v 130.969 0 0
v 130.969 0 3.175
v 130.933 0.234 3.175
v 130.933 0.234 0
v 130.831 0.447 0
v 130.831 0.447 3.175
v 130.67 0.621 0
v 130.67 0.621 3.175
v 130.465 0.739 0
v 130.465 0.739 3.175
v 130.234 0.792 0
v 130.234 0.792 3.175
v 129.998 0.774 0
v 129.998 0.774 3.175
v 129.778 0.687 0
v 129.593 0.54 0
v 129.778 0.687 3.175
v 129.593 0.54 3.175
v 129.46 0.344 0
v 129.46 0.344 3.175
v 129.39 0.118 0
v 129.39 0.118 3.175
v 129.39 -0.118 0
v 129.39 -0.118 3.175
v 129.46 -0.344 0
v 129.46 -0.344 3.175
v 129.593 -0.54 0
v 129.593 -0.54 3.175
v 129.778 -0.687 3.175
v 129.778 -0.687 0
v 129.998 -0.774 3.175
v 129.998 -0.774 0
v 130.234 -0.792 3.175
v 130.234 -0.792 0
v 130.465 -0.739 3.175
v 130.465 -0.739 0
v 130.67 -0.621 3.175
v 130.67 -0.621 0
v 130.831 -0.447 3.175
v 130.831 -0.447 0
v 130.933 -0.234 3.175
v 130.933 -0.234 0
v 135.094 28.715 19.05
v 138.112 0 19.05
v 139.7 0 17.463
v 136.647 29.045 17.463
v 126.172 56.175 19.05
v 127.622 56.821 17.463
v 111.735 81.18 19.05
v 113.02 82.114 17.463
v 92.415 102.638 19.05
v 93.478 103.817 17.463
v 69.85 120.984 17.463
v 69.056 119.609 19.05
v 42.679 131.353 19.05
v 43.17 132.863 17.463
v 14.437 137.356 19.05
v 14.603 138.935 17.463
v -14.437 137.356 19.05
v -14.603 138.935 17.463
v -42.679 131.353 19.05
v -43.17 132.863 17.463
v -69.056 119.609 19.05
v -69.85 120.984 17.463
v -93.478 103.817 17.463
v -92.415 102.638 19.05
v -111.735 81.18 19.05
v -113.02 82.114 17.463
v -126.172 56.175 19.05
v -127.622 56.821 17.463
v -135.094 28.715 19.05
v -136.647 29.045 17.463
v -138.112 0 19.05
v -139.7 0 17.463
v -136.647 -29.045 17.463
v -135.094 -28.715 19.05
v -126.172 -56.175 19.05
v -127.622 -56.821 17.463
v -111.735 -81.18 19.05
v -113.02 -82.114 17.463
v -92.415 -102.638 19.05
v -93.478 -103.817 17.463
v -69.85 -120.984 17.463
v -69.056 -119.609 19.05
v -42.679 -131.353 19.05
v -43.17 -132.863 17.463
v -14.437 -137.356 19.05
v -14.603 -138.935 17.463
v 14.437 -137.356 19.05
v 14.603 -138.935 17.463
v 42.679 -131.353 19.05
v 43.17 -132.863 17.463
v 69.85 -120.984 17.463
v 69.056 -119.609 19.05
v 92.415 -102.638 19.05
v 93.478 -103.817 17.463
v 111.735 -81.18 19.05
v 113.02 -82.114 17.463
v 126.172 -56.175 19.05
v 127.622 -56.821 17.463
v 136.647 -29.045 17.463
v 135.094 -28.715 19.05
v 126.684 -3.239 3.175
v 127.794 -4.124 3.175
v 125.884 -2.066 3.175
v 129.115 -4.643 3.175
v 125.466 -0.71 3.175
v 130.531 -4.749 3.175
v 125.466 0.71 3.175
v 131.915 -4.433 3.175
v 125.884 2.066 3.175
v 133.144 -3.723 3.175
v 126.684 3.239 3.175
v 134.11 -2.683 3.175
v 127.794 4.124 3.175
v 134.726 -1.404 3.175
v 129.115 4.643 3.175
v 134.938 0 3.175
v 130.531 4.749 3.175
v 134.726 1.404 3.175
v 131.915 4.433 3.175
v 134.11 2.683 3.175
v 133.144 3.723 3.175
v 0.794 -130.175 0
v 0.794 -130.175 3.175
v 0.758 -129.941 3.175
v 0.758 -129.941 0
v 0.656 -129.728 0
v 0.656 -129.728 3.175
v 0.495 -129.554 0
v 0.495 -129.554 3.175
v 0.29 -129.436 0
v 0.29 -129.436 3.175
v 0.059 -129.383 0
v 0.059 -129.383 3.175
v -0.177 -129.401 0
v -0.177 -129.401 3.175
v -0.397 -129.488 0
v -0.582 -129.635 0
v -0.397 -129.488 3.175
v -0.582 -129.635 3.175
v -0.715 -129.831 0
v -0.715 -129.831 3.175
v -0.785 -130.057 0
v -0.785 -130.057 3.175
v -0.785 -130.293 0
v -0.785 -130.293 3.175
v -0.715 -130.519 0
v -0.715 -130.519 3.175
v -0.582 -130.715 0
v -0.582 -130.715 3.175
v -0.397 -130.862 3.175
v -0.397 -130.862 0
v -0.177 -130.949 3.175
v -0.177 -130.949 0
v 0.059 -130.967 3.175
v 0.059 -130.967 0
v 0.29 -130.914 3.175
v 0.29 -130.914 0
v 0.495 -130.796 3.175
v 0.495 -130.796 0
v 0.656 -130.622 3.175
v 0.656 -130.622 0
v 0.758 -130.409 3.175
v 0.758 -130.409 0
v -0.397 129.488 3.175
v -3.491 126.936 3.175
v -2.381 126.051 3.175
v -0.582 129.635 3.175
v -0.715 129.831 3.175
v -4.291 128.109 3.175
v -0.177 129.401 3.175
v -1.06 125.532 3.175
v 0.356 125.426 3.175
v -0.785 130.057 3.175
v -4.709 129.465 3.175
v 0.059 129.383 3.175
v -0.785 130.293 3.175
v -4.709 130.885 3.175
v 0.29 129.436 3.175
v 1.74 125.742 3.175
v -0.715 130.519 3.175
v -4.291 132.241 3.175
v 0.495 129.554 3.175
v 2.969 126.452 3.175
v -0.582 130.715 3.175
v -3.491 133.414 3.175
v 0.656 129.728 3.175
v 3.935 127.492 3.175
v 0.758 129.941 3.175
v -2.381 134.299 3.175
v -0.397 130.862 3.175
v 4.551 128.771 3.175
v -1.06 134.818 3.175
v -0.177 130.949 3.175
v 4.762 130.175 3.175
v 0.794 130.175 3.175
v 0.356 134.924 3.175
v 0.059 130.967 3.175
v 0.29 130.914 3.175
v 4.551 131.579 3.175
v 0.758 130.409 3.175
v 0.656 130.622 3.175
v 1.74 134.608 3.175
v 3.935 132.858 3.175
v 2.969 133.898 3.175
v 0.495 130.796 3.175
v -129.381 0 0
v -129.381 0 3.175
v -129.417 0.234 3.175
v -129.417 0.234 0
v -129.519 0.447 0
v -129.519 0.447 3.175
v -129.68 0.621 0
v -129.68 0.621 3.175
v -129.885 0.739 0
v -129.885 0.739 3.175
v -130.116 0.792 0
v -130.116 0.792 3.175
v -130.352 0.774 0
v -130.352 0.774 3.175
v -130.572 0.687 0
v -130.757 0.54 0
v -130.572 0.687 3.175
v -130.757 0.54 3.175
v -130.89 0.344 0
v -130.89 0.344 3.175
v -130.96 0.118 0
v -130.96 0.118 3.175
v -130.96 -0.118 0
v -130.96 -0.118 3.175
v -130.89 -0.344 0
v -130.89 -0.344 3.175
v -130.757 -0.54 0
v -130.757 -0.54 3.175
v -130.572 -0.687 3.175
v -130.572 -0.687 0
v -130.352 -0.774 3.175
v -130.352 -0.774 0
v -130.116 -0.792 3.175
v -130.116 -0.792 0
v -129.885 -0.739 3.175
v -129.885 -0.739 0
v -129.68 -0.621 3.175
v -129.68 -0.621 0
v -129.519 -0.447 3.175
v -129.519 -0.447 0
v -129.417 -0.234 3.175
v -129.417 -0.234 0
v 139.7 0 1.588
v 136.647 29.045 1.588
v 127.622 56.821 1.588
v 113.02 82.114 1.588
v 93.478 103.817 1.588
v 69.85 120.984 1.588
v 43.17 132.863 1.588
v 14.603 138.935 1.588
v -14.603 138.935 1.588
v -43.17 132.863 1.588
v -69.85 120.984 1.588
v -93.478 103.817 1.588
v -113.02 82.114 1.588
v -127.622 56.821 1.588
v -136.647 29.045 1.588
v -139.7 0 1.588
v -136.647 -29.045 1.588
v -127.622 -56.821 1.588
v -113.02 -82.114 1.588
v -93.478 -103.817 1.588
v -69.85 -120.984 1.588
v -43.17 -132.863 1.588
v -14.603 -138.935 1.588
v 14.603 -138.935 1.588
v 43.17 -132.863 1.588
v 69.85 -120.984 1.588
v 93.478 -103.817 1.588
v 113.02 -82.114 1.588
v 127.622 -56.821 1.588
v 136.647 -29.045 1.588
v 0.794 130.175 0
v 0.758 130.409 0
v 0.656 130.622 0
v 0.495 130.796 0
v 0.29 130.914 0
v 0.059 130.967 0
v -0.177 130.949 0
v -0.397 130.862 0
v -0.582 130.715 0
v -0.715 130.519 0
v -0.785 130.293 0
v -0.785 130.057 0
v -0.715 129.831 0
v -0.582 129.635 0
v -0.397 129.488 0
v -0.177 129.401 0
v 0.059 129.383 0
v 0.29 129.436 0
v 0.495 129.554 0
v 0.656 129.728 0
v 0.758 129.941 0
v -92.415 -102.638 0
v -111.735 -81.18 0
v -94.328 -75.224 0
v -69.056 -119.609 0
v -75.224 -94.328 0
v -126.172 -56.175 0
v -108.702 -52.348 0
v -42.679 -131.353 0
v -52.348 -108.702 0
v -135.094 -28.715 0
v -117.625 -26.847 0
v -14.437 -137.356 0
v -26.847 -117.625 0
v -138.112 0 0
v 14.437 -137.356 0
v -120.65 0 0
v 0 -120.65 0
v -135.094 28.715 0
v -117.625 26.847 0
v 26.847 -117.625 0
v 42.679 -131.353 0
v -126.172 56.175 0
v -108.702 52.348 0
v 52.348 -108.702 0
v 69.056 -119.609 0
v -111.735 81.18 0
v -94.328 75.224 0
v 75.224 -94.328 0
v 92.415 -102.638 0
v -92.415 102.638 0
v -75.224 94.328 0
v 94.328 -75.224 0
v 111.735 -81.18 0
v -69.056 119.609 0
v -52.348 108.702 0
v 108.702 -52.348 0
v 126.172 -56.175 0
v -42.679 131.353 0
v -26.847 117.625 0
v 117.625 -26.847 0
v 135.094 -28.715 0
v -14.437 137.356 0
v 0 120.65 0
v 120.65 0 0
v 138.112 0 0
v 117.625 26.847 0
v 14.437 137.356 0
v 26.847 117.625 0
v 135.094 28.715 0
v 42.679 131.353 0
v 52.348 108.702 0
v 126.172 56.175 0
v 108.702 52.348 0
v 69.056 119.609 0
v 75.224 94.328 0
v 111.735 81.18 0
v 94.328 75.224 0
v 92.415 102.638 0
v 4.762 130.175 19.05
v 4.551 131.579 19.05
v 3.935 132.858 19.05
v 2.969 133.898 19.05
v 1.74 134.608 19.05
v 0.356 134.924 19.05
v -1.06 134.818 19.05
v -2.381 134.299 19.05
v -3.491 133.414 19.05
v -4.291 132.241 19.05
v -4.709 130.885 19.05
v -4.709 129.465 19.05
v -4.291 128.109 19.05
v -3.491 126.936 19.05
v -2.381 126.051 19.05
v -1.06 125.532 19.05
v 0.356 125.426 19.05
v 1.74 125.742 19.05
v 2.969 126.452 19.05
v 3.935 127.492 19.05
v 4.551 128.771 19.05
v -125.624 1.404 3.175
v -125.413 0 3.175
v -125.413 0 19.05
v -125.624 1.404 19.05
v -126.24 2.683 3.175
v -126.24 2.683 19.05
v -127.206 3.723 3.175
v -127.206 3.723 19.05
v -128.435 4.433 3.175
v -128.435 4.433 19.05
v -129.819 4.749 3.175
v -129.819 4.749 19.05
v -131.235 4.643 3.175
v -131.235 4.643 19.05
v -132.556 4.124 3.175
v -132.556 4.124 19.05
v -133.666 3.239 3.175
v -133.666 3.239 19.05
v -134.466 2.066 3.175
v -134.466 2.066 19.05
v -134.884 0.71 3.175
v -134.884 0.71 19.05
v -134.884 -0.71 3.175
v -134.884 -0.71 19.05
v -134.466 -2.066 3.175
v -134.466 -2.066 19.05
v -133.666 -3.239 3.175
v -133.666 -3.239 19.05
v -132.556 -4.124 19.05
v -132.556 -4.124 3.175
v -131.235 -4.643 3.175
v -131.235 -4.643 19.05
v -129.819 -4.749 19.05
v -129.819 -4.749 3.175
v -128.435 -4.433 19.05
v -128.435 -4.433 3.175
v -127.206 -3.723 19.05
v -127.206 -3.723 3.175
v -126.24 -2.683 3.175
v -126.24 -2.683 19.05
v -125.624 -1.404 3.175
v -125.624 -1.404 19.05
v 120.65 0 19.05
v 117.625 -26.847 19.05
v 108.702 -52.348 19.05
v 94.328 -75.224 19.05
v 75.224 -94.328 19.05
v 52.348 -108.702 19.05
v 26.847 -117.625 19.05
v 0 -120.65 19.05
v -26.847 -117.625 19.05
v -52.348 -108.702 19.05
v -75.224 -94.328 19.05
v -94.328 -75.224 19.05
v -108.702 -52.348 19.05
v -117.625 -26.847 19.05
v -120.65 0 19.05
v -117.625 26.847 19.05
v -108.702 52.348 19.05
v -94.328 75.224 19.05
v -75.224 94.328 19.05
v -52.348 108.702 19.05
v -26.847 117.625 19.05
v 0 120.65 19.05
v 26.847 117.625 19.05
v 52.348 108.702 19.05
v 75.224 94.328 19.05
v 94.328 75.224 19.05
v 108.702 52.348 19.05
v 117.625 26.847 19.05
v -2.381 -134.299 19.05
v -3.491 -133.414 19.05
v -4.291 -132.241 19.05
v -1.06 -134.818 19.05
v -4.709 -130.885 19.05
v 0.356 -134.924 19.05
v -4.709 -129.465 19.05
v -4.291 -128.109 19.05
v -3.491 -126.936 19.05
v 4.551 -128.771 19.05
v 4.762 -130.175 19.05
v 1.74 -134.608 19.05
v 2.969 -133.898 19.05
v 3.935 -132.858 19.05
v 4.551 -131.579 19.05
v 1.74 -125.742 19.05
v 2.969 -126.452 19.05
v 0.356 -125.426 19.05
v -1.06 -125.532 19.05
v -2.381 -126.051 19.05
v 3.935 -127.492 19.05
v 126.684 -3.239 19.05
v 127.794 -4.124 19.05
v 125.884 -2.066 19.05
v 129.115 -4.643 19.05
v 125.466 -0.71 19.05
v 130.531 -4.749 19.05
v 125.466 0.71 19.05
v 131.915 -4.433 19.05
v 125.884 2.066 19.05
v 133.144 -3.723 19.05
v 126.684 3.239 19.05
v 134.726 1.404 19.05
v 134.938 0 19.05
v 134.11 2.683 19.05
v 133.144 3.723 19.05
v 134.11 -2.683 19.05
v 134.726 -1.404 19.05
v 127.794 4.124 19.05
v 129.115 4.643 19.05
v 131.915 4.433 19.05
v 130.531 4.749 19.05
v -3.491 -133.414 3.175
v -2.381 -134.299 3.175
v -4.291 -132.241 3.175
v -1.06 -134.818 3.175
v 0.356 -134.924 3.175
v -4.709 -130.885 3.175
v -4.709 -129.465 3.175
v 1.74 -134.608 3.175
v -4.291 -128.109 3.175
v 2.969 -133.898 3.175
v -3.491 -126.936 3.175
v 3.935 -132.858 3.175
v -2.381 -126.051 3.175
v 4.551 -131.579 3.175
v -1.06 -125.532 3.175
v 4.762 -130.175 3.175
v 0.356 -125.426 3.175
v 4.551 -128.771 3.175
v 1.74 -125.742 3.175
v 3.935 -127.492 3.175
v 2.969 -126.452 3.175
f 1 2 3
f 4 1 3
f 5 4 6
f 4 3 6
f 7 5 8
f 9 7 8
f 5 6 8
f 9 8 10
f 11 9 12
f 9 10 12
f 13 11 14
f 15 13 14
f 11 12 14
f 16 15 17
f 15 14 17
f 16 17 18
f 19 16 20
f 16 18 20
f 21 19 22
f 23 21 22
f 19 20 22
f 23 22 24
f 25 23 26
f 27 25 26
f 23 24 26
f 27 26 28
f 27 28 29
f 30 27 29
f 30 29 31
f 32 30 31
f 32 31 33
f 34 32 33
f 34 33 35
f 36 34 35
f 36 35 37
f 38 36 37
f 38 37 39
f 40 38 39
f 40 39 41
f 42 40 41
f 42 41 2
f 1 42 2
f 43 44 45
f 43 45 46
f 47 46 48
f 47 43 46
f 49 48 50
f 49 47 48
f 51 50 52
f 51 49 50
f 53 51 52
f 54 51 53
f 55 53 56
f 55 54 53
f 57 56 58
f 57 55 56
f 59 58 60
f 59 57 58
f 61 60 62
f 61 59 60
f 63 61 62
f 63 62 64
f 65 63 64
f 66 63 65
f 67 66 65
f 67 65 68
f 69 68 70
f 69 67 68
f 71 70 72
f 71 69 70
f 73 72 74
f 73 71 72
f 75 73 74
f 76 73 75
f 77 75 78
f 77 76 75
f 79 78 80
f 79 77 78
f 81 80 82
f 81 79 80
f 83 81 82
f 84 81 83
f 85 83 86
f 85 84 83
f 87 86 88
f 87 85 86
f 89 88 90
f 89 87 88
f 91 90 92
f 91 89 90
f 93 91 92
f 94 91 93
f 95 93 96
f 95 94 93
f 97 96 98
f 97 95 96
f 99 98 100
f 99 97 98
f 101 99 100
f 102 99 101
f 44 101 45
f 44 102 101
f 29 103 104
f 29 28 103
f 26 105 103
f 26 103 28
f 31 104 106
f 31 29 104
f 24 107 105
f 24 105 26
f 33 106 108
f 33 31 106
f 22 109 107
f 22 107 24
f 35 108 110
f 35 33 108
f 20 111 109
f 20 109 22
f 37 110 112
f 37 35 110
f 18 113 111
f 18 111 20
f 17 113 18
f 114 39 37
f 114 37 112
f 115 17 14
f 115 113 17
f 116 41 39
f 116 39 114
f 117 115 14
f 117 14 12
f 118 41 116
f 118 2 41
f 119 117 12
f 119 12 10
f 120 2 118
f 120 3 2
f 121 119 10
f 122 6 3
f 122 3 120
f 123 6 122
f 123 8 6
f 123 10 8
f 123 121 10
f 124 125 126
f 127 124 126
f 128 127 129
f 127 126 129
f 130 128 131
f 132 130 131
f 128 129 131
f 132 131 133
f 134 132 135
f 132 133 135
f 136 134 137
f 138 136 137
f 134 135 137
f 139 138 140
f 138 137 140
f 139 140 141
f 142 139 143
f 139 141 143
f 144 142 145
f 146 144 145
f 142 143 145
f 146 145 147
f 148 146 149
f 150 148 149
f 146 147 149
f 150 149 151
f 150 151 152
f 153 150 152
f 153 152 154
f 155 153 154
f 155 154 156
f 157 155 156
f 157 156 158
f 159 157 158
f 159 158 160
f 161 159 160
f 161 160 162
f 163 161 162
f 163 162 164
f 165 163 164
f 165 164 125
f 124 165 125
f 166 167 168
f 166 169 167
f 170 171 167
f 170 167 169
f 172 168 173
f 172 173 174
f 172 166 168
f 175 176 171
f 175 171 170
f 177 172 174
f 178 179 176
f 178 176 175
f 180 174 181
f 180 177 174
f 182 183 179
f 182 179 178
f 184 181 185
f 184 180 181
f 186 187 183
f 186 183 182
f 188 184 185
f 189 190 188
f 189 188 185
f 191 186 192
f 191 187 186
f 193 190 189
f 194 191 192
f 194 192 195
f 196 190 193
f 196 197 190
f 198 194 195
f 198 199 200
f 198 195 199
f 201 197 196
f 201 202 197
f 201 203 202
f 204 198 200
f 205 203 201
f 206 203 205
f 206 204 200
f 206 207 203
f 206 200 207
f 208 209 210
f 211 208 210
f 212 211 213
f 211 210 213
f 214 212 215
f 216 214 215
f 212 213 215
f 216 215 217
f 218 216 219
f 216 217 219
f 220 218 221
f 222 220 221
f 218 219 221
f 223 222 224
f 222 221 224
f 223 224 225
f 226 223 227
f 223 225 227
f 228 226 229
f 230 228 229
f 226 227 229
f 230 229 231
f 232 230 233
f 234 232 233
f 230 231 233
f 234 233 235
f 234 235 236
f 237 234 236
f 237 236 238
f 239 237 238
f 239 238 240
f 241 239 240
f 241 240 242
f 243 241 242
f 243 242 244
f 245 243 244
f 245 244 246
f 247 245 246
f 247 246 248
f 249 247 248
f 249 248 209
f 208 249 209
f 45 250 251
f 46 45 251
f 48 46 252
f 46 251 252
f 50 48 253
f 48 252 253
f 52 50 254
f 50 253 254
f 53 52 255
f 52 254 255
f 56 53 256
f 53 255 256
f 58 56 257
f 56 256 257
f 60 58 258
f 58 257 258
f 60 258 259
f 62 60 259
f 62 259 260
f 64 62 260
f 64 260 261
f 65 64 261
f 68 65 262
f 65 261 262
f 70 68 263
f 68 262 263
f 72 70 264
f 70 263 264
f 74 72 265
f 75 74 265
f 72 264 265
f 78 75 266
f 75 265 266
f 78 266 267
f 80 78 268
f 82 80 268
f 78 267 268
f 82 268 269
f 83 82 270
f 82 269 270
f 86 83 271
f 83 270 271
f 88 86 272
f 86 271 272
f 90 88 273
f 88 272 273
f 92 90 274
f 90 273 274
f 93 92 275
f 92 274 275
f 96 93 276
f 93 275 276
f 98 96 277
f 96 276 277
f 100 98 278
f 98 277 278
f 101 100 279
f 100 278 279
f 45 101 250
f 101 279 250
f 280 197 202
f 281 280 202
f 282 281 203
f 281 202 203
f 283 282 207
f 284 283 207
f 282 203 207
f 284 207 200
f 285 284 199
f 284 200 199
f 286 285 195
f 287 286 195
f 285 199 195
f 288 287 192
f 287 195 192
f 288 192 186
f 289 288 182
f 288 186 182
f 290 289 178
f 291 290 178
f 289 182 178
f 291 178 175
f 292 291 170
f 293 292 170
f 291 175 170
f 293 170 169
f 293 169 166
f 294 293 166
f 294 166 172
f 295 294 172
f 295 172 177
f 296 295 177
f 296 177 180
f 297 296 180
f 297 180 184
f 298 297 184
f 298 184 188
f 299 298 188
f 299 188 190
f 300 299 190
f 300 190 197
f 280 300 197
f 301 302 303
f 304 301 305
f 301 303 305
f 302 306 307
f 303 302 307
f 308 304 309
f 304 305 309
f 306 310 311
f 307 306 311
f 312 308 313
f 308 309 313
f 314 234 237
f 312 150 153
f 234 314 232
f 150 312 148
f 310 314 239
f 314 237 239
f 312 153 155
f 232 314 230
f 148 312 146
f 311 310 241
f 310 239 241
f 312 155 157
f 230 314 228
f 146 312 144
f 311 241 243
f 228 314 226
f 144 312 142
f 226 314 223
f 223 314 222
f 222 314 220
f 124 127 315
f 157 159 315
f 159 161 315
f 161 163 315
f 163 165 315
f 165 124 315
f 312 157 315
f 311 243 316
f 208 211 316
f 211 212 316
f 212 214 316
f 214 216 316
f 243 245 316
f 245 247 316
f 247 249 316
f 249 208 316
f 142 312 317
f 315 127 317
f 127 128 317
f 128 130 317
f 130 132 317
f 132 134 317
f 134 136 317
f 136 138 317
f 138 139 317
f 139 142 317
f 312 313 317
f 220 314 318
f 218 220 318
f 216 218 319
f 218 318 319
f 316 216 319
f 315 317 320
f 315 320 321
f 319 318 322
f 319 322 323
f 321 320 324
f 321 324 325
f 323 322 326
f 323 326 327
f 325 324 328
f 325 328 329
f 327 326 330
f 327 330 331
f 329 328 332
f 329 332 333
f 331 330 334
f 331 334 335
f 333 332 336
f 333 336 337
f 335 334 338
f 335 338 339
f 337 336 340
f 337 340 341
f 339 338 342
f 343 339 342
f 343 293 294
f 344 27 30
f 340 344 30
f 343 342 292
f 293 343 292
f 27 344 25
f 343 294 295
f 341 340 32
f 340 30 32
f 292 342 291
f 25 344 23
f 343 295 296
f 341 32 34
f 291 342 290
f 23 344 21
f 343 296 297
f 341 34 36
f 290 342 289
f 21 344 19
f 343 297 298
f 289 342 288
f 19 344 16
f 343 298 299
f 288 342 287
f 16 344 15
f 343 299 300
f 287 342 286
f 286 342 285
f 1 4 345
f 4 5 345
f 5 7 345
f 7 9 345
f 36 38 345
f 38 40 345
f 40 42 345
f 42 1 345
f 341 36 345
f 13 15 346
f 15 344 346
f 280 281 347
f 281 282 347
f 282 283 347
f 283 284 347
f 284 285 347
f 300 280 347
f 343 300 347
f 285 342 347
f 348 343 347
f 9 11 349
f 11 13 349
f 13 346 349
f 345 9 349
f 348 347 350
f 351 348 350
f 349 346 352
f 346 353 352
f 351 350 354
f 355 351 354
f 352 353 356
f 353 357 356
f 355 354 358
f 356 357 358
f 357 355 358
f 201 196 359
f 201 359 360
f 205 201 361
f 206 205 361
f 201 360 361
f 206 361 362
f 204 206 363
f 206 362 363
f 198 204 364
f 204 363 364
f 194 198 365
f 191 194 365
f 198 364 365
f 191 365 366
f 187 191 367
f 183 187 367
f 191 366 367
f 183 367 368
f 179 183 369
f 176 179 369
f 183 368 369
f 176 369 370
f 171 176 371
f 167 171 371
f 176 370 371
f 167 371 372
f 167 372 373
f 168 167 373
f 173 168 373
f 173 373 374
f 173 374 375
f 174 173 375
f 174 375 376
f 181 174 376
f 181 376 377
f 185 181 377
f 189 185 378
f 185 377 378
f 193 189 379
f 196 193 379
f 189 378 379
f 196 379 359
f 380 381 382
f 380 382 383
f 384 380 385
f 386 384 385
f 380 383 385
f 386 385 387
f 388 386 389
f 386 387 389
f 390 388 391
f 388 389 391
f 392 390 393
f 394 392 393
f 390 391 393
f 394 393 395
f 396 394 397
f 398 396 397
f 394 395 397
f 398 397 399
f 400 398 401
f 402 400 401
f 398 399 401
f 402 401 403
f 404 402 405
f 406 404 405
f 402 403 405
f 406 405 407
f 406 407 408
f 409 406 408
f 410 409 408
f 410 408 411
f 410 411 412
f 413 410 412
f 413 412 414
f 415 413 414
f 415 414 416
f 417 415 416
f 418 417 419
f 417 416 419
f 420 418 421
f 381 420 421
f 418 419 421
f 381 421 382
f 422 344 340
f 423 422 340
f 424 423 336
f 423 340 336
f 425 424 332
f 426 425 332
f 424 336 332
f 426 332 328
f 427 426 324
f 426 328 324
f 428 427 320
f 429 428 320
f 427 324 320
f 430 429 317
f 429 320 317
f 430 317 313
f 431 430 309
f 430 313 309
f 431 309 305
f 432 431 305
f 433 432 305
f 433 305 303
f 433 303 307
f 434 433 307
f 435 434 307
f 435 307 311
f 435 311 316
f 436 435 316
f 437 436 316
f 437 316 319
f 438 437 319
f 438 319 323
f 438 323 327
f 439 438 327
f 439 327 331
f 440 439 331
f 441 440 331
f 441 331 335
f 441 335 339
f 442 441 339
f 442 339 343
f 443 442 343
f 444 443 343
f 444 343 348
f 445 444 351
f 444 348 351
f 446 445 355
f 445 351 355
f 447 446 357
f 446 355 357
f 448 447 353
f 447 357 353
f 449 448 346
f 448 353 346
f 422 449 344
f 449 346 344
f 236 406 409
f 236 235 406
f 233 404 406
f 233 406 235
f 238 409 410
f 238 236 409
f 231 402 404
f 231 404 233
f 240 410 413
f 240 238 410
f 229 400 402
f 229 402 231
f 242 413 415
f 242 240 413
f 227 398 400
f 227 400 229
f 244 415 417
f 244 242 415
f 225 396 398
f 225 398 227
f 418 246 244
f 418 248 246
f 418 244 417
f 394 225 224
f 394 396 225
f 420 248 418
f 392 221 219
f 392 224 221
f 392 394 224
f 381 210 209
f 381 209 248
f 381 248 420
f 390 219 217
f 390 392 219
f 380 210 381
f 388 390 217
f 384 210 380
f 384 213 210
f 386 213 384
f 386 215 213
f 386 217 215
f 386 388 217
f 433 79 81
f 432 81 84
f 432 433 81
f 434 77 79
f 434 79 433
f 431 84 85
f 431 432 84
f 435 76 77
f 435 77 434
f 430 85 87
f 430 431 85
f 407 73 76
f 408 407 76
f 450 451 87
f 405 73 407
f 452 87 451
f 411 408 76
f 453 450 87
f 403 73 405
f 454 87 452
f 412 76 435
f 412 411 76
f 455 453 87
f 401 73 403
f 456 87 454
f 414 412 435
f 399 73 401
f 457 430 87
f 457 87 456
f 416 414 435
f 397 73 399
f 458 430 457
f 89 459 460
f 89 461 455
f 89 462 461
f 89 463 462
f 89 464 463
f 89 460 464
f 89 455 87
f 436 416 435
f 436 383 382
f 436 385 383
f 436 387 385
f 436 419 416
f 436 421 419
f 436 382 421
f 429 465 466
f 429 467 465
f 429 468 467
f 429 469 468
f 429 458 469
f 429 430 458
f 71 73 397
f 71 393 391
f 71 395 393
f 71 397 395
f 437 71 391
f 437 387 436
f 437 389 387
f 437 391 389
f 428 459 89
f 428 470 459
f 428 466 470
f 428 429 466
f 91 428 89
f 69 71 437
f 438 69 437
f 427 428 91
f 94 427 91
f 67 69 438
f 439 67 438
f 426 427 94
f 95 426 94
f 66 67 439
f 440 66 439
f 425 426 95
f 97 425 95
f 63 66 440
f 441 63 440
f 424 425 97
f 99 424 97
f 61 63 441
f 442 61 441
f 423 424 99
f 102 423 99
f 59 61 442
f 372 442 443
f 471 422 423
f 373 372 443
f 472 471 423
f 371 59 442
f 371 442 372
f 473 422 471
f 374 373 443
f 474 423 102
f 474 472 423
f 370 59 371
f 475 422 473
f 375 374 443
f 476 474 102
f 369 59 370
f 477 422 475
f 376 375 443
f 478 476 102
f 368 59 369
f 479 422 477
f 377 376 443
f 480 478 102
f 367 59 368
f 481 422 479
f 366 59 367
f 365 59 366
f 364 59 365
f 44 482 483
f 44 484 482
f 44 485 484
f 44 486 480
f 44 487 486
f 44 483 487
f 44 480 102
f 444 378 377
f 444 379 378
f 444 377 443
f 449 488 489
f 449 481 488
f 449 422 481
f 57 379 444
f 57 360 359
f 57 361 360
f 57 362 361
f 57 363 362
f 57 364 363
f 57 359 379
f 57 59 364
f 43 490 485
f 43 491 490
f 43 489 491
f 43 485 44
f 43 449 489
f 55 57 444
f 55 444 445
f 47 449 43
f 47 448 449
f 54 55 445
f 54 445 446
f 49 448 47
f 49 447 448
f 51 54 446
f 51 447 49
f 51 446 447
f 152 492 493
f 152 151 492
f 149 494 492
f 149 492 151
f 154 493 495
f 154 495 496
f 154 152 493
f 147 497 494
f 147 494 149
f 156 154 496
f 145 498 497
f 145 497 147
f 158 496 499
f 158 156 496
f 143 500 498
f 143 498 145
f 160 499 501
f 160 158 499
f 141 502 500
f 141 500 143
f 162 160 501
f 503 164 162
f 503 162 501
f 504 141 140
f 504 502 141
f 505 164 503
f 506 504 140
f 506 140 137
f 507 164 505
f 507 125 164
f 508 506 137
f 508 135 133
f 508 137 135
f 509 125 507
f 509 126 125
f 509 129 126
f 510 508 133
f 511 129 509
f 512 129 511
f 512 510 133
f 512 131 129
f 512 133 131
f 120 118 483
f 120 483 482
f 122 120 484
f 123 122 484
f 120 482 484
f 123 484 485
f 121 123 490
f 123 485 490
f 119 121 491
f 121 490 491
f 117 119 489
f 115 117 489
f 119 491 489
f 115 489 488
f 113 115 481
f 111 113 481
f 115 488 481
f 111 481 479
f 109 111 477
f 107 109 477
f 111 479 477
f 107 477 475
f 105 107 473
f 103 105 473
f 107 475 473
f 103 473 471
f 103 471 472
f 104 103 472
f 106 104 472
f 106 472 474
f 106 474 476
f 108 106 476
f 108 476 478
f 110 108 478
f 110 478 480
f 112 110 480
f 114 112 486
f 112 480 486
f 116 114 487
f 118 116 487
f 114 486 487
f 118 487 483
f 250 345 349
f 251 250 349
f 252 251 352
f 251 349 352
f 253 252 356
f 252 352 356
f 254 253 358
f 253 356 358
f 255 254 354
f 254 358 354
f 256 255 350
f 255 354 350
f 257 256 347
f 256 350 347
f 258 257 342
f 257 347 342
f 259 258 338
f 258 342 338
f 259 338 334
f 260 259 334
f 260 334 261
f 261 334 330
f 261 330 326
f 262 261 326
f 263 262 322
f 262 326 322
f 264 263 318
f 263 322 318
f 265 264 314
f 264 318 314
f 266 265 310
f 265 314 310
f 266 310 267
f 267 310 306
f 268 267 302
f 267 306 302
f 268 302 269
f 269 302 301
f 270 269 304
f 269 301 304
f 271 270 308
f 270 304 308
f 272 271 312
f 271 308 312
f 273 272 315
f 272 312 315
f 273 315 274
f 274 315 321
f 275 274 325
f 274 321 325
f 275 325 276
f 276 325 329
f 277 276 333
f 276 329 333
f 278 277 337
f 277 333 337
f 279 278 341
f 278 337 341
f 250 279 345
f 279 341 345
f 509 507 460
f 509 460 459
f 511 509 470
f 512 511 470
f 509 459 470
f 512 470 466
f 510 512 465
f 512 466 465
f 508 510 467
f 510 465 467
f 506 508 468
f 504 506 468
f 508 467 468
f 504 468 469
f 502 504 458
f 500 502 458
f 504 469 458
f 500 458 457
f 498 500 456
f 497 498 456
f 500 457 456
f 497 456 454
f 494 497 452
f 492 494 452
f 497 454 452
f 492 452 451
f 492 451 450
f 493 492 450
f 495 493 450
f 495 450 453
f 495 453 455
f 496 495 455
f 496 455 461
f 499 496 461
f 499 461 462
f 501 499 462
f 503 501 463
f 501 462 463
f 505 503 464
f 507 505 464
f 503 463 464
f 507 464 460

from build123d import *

# Parameters (mm, degrees)
F2_R      = 139.7
F3_DEPTH  = 19.05
F4_SIZE   = 1.5875
F5_R      = 120.65
F6_DEPTH  = 19.051
F7_R      = 0.79375
F8_DEPTH  = 19.051
F9_R      = 4.7625
F9_R_2    = 0.79375
F10_DEPTH = 15.875


# Not quite as in the source:
# - a variable given as a bare number and used for a length is read in inches; the dataset says mm whatever the document's units were


with BuildPart() as f3:
    # F2 (on Top) → F3 (new body)
    with BuildSketch(Plane.XY):
        Circle(F2_R)
    extrude(amount=F3_DEPTH)

    # F4
    f4_edges = [f3.edges().sort_by_distance(p)[0] for p in [
        (-139.7, 0, 19.05),
        (-139.7, 0, 0),
    ]]
    chamfer(f4_edges, length=F4_SIZE)

    # F5 (on face) → F6 (cut, through all)
    with BuildSketch(Plane(origin=(0, 0, 0), x_dir=(1, 0, 0), z_dir=(0, 0, -1))):
        Circle(F5_R)
    extrude(amount=-F6_DEPTH, mode=Mode.SUBTRACT)

    # F7 (on face) → F8 (cut, through all)
    with BuildSketch(Plane.XY.offset(19.05)):
        with Locations((0, 130.175)):
            Circle(F7_R)
        with Locations((130.175, 0)):
            Circle(F7_R)
        with Locations((0, -130.175)):
            Circle(F7_R)
        with Locations((-130.175, 0)):
            Circle(F7_R)
    extrude(amount=-F8_DEPTH, mode=Mode.SUBTRACT)

    # F9 (on face) → F10 (cut)
    with BuildSketch(Plane.XY.offset(19.05)):
        with Locations((0, 130.175)):
            Circle(F9_R)
        with Locations((0, 130.175)):
            Circle(F9_R_2, mode=Mode.SUBTRACT)
        with Locations((130.175, 0)):
            Circle(F9_R)
        with Locations((130.175, 0)):
            Circle(F9_R_2, mode=Mode.SUBTRACT)
        with Locations((-130.175, 0)):
            Circle(F9_R)
        with Locations((-130.175, 0)):
            Circle(F9_R_2, mode=Mode.SUBTRACT)
        with Locations((0, -130.175)):
            Circle(F9_R)
        with Locations((0, -130.175)):
            Circle(F9_R_2, mode=Mode.SUBTRACT)
    extrude(amount=-F10_DEPTH, mode=Mode.SUBTRACT)


solid = f3.part
